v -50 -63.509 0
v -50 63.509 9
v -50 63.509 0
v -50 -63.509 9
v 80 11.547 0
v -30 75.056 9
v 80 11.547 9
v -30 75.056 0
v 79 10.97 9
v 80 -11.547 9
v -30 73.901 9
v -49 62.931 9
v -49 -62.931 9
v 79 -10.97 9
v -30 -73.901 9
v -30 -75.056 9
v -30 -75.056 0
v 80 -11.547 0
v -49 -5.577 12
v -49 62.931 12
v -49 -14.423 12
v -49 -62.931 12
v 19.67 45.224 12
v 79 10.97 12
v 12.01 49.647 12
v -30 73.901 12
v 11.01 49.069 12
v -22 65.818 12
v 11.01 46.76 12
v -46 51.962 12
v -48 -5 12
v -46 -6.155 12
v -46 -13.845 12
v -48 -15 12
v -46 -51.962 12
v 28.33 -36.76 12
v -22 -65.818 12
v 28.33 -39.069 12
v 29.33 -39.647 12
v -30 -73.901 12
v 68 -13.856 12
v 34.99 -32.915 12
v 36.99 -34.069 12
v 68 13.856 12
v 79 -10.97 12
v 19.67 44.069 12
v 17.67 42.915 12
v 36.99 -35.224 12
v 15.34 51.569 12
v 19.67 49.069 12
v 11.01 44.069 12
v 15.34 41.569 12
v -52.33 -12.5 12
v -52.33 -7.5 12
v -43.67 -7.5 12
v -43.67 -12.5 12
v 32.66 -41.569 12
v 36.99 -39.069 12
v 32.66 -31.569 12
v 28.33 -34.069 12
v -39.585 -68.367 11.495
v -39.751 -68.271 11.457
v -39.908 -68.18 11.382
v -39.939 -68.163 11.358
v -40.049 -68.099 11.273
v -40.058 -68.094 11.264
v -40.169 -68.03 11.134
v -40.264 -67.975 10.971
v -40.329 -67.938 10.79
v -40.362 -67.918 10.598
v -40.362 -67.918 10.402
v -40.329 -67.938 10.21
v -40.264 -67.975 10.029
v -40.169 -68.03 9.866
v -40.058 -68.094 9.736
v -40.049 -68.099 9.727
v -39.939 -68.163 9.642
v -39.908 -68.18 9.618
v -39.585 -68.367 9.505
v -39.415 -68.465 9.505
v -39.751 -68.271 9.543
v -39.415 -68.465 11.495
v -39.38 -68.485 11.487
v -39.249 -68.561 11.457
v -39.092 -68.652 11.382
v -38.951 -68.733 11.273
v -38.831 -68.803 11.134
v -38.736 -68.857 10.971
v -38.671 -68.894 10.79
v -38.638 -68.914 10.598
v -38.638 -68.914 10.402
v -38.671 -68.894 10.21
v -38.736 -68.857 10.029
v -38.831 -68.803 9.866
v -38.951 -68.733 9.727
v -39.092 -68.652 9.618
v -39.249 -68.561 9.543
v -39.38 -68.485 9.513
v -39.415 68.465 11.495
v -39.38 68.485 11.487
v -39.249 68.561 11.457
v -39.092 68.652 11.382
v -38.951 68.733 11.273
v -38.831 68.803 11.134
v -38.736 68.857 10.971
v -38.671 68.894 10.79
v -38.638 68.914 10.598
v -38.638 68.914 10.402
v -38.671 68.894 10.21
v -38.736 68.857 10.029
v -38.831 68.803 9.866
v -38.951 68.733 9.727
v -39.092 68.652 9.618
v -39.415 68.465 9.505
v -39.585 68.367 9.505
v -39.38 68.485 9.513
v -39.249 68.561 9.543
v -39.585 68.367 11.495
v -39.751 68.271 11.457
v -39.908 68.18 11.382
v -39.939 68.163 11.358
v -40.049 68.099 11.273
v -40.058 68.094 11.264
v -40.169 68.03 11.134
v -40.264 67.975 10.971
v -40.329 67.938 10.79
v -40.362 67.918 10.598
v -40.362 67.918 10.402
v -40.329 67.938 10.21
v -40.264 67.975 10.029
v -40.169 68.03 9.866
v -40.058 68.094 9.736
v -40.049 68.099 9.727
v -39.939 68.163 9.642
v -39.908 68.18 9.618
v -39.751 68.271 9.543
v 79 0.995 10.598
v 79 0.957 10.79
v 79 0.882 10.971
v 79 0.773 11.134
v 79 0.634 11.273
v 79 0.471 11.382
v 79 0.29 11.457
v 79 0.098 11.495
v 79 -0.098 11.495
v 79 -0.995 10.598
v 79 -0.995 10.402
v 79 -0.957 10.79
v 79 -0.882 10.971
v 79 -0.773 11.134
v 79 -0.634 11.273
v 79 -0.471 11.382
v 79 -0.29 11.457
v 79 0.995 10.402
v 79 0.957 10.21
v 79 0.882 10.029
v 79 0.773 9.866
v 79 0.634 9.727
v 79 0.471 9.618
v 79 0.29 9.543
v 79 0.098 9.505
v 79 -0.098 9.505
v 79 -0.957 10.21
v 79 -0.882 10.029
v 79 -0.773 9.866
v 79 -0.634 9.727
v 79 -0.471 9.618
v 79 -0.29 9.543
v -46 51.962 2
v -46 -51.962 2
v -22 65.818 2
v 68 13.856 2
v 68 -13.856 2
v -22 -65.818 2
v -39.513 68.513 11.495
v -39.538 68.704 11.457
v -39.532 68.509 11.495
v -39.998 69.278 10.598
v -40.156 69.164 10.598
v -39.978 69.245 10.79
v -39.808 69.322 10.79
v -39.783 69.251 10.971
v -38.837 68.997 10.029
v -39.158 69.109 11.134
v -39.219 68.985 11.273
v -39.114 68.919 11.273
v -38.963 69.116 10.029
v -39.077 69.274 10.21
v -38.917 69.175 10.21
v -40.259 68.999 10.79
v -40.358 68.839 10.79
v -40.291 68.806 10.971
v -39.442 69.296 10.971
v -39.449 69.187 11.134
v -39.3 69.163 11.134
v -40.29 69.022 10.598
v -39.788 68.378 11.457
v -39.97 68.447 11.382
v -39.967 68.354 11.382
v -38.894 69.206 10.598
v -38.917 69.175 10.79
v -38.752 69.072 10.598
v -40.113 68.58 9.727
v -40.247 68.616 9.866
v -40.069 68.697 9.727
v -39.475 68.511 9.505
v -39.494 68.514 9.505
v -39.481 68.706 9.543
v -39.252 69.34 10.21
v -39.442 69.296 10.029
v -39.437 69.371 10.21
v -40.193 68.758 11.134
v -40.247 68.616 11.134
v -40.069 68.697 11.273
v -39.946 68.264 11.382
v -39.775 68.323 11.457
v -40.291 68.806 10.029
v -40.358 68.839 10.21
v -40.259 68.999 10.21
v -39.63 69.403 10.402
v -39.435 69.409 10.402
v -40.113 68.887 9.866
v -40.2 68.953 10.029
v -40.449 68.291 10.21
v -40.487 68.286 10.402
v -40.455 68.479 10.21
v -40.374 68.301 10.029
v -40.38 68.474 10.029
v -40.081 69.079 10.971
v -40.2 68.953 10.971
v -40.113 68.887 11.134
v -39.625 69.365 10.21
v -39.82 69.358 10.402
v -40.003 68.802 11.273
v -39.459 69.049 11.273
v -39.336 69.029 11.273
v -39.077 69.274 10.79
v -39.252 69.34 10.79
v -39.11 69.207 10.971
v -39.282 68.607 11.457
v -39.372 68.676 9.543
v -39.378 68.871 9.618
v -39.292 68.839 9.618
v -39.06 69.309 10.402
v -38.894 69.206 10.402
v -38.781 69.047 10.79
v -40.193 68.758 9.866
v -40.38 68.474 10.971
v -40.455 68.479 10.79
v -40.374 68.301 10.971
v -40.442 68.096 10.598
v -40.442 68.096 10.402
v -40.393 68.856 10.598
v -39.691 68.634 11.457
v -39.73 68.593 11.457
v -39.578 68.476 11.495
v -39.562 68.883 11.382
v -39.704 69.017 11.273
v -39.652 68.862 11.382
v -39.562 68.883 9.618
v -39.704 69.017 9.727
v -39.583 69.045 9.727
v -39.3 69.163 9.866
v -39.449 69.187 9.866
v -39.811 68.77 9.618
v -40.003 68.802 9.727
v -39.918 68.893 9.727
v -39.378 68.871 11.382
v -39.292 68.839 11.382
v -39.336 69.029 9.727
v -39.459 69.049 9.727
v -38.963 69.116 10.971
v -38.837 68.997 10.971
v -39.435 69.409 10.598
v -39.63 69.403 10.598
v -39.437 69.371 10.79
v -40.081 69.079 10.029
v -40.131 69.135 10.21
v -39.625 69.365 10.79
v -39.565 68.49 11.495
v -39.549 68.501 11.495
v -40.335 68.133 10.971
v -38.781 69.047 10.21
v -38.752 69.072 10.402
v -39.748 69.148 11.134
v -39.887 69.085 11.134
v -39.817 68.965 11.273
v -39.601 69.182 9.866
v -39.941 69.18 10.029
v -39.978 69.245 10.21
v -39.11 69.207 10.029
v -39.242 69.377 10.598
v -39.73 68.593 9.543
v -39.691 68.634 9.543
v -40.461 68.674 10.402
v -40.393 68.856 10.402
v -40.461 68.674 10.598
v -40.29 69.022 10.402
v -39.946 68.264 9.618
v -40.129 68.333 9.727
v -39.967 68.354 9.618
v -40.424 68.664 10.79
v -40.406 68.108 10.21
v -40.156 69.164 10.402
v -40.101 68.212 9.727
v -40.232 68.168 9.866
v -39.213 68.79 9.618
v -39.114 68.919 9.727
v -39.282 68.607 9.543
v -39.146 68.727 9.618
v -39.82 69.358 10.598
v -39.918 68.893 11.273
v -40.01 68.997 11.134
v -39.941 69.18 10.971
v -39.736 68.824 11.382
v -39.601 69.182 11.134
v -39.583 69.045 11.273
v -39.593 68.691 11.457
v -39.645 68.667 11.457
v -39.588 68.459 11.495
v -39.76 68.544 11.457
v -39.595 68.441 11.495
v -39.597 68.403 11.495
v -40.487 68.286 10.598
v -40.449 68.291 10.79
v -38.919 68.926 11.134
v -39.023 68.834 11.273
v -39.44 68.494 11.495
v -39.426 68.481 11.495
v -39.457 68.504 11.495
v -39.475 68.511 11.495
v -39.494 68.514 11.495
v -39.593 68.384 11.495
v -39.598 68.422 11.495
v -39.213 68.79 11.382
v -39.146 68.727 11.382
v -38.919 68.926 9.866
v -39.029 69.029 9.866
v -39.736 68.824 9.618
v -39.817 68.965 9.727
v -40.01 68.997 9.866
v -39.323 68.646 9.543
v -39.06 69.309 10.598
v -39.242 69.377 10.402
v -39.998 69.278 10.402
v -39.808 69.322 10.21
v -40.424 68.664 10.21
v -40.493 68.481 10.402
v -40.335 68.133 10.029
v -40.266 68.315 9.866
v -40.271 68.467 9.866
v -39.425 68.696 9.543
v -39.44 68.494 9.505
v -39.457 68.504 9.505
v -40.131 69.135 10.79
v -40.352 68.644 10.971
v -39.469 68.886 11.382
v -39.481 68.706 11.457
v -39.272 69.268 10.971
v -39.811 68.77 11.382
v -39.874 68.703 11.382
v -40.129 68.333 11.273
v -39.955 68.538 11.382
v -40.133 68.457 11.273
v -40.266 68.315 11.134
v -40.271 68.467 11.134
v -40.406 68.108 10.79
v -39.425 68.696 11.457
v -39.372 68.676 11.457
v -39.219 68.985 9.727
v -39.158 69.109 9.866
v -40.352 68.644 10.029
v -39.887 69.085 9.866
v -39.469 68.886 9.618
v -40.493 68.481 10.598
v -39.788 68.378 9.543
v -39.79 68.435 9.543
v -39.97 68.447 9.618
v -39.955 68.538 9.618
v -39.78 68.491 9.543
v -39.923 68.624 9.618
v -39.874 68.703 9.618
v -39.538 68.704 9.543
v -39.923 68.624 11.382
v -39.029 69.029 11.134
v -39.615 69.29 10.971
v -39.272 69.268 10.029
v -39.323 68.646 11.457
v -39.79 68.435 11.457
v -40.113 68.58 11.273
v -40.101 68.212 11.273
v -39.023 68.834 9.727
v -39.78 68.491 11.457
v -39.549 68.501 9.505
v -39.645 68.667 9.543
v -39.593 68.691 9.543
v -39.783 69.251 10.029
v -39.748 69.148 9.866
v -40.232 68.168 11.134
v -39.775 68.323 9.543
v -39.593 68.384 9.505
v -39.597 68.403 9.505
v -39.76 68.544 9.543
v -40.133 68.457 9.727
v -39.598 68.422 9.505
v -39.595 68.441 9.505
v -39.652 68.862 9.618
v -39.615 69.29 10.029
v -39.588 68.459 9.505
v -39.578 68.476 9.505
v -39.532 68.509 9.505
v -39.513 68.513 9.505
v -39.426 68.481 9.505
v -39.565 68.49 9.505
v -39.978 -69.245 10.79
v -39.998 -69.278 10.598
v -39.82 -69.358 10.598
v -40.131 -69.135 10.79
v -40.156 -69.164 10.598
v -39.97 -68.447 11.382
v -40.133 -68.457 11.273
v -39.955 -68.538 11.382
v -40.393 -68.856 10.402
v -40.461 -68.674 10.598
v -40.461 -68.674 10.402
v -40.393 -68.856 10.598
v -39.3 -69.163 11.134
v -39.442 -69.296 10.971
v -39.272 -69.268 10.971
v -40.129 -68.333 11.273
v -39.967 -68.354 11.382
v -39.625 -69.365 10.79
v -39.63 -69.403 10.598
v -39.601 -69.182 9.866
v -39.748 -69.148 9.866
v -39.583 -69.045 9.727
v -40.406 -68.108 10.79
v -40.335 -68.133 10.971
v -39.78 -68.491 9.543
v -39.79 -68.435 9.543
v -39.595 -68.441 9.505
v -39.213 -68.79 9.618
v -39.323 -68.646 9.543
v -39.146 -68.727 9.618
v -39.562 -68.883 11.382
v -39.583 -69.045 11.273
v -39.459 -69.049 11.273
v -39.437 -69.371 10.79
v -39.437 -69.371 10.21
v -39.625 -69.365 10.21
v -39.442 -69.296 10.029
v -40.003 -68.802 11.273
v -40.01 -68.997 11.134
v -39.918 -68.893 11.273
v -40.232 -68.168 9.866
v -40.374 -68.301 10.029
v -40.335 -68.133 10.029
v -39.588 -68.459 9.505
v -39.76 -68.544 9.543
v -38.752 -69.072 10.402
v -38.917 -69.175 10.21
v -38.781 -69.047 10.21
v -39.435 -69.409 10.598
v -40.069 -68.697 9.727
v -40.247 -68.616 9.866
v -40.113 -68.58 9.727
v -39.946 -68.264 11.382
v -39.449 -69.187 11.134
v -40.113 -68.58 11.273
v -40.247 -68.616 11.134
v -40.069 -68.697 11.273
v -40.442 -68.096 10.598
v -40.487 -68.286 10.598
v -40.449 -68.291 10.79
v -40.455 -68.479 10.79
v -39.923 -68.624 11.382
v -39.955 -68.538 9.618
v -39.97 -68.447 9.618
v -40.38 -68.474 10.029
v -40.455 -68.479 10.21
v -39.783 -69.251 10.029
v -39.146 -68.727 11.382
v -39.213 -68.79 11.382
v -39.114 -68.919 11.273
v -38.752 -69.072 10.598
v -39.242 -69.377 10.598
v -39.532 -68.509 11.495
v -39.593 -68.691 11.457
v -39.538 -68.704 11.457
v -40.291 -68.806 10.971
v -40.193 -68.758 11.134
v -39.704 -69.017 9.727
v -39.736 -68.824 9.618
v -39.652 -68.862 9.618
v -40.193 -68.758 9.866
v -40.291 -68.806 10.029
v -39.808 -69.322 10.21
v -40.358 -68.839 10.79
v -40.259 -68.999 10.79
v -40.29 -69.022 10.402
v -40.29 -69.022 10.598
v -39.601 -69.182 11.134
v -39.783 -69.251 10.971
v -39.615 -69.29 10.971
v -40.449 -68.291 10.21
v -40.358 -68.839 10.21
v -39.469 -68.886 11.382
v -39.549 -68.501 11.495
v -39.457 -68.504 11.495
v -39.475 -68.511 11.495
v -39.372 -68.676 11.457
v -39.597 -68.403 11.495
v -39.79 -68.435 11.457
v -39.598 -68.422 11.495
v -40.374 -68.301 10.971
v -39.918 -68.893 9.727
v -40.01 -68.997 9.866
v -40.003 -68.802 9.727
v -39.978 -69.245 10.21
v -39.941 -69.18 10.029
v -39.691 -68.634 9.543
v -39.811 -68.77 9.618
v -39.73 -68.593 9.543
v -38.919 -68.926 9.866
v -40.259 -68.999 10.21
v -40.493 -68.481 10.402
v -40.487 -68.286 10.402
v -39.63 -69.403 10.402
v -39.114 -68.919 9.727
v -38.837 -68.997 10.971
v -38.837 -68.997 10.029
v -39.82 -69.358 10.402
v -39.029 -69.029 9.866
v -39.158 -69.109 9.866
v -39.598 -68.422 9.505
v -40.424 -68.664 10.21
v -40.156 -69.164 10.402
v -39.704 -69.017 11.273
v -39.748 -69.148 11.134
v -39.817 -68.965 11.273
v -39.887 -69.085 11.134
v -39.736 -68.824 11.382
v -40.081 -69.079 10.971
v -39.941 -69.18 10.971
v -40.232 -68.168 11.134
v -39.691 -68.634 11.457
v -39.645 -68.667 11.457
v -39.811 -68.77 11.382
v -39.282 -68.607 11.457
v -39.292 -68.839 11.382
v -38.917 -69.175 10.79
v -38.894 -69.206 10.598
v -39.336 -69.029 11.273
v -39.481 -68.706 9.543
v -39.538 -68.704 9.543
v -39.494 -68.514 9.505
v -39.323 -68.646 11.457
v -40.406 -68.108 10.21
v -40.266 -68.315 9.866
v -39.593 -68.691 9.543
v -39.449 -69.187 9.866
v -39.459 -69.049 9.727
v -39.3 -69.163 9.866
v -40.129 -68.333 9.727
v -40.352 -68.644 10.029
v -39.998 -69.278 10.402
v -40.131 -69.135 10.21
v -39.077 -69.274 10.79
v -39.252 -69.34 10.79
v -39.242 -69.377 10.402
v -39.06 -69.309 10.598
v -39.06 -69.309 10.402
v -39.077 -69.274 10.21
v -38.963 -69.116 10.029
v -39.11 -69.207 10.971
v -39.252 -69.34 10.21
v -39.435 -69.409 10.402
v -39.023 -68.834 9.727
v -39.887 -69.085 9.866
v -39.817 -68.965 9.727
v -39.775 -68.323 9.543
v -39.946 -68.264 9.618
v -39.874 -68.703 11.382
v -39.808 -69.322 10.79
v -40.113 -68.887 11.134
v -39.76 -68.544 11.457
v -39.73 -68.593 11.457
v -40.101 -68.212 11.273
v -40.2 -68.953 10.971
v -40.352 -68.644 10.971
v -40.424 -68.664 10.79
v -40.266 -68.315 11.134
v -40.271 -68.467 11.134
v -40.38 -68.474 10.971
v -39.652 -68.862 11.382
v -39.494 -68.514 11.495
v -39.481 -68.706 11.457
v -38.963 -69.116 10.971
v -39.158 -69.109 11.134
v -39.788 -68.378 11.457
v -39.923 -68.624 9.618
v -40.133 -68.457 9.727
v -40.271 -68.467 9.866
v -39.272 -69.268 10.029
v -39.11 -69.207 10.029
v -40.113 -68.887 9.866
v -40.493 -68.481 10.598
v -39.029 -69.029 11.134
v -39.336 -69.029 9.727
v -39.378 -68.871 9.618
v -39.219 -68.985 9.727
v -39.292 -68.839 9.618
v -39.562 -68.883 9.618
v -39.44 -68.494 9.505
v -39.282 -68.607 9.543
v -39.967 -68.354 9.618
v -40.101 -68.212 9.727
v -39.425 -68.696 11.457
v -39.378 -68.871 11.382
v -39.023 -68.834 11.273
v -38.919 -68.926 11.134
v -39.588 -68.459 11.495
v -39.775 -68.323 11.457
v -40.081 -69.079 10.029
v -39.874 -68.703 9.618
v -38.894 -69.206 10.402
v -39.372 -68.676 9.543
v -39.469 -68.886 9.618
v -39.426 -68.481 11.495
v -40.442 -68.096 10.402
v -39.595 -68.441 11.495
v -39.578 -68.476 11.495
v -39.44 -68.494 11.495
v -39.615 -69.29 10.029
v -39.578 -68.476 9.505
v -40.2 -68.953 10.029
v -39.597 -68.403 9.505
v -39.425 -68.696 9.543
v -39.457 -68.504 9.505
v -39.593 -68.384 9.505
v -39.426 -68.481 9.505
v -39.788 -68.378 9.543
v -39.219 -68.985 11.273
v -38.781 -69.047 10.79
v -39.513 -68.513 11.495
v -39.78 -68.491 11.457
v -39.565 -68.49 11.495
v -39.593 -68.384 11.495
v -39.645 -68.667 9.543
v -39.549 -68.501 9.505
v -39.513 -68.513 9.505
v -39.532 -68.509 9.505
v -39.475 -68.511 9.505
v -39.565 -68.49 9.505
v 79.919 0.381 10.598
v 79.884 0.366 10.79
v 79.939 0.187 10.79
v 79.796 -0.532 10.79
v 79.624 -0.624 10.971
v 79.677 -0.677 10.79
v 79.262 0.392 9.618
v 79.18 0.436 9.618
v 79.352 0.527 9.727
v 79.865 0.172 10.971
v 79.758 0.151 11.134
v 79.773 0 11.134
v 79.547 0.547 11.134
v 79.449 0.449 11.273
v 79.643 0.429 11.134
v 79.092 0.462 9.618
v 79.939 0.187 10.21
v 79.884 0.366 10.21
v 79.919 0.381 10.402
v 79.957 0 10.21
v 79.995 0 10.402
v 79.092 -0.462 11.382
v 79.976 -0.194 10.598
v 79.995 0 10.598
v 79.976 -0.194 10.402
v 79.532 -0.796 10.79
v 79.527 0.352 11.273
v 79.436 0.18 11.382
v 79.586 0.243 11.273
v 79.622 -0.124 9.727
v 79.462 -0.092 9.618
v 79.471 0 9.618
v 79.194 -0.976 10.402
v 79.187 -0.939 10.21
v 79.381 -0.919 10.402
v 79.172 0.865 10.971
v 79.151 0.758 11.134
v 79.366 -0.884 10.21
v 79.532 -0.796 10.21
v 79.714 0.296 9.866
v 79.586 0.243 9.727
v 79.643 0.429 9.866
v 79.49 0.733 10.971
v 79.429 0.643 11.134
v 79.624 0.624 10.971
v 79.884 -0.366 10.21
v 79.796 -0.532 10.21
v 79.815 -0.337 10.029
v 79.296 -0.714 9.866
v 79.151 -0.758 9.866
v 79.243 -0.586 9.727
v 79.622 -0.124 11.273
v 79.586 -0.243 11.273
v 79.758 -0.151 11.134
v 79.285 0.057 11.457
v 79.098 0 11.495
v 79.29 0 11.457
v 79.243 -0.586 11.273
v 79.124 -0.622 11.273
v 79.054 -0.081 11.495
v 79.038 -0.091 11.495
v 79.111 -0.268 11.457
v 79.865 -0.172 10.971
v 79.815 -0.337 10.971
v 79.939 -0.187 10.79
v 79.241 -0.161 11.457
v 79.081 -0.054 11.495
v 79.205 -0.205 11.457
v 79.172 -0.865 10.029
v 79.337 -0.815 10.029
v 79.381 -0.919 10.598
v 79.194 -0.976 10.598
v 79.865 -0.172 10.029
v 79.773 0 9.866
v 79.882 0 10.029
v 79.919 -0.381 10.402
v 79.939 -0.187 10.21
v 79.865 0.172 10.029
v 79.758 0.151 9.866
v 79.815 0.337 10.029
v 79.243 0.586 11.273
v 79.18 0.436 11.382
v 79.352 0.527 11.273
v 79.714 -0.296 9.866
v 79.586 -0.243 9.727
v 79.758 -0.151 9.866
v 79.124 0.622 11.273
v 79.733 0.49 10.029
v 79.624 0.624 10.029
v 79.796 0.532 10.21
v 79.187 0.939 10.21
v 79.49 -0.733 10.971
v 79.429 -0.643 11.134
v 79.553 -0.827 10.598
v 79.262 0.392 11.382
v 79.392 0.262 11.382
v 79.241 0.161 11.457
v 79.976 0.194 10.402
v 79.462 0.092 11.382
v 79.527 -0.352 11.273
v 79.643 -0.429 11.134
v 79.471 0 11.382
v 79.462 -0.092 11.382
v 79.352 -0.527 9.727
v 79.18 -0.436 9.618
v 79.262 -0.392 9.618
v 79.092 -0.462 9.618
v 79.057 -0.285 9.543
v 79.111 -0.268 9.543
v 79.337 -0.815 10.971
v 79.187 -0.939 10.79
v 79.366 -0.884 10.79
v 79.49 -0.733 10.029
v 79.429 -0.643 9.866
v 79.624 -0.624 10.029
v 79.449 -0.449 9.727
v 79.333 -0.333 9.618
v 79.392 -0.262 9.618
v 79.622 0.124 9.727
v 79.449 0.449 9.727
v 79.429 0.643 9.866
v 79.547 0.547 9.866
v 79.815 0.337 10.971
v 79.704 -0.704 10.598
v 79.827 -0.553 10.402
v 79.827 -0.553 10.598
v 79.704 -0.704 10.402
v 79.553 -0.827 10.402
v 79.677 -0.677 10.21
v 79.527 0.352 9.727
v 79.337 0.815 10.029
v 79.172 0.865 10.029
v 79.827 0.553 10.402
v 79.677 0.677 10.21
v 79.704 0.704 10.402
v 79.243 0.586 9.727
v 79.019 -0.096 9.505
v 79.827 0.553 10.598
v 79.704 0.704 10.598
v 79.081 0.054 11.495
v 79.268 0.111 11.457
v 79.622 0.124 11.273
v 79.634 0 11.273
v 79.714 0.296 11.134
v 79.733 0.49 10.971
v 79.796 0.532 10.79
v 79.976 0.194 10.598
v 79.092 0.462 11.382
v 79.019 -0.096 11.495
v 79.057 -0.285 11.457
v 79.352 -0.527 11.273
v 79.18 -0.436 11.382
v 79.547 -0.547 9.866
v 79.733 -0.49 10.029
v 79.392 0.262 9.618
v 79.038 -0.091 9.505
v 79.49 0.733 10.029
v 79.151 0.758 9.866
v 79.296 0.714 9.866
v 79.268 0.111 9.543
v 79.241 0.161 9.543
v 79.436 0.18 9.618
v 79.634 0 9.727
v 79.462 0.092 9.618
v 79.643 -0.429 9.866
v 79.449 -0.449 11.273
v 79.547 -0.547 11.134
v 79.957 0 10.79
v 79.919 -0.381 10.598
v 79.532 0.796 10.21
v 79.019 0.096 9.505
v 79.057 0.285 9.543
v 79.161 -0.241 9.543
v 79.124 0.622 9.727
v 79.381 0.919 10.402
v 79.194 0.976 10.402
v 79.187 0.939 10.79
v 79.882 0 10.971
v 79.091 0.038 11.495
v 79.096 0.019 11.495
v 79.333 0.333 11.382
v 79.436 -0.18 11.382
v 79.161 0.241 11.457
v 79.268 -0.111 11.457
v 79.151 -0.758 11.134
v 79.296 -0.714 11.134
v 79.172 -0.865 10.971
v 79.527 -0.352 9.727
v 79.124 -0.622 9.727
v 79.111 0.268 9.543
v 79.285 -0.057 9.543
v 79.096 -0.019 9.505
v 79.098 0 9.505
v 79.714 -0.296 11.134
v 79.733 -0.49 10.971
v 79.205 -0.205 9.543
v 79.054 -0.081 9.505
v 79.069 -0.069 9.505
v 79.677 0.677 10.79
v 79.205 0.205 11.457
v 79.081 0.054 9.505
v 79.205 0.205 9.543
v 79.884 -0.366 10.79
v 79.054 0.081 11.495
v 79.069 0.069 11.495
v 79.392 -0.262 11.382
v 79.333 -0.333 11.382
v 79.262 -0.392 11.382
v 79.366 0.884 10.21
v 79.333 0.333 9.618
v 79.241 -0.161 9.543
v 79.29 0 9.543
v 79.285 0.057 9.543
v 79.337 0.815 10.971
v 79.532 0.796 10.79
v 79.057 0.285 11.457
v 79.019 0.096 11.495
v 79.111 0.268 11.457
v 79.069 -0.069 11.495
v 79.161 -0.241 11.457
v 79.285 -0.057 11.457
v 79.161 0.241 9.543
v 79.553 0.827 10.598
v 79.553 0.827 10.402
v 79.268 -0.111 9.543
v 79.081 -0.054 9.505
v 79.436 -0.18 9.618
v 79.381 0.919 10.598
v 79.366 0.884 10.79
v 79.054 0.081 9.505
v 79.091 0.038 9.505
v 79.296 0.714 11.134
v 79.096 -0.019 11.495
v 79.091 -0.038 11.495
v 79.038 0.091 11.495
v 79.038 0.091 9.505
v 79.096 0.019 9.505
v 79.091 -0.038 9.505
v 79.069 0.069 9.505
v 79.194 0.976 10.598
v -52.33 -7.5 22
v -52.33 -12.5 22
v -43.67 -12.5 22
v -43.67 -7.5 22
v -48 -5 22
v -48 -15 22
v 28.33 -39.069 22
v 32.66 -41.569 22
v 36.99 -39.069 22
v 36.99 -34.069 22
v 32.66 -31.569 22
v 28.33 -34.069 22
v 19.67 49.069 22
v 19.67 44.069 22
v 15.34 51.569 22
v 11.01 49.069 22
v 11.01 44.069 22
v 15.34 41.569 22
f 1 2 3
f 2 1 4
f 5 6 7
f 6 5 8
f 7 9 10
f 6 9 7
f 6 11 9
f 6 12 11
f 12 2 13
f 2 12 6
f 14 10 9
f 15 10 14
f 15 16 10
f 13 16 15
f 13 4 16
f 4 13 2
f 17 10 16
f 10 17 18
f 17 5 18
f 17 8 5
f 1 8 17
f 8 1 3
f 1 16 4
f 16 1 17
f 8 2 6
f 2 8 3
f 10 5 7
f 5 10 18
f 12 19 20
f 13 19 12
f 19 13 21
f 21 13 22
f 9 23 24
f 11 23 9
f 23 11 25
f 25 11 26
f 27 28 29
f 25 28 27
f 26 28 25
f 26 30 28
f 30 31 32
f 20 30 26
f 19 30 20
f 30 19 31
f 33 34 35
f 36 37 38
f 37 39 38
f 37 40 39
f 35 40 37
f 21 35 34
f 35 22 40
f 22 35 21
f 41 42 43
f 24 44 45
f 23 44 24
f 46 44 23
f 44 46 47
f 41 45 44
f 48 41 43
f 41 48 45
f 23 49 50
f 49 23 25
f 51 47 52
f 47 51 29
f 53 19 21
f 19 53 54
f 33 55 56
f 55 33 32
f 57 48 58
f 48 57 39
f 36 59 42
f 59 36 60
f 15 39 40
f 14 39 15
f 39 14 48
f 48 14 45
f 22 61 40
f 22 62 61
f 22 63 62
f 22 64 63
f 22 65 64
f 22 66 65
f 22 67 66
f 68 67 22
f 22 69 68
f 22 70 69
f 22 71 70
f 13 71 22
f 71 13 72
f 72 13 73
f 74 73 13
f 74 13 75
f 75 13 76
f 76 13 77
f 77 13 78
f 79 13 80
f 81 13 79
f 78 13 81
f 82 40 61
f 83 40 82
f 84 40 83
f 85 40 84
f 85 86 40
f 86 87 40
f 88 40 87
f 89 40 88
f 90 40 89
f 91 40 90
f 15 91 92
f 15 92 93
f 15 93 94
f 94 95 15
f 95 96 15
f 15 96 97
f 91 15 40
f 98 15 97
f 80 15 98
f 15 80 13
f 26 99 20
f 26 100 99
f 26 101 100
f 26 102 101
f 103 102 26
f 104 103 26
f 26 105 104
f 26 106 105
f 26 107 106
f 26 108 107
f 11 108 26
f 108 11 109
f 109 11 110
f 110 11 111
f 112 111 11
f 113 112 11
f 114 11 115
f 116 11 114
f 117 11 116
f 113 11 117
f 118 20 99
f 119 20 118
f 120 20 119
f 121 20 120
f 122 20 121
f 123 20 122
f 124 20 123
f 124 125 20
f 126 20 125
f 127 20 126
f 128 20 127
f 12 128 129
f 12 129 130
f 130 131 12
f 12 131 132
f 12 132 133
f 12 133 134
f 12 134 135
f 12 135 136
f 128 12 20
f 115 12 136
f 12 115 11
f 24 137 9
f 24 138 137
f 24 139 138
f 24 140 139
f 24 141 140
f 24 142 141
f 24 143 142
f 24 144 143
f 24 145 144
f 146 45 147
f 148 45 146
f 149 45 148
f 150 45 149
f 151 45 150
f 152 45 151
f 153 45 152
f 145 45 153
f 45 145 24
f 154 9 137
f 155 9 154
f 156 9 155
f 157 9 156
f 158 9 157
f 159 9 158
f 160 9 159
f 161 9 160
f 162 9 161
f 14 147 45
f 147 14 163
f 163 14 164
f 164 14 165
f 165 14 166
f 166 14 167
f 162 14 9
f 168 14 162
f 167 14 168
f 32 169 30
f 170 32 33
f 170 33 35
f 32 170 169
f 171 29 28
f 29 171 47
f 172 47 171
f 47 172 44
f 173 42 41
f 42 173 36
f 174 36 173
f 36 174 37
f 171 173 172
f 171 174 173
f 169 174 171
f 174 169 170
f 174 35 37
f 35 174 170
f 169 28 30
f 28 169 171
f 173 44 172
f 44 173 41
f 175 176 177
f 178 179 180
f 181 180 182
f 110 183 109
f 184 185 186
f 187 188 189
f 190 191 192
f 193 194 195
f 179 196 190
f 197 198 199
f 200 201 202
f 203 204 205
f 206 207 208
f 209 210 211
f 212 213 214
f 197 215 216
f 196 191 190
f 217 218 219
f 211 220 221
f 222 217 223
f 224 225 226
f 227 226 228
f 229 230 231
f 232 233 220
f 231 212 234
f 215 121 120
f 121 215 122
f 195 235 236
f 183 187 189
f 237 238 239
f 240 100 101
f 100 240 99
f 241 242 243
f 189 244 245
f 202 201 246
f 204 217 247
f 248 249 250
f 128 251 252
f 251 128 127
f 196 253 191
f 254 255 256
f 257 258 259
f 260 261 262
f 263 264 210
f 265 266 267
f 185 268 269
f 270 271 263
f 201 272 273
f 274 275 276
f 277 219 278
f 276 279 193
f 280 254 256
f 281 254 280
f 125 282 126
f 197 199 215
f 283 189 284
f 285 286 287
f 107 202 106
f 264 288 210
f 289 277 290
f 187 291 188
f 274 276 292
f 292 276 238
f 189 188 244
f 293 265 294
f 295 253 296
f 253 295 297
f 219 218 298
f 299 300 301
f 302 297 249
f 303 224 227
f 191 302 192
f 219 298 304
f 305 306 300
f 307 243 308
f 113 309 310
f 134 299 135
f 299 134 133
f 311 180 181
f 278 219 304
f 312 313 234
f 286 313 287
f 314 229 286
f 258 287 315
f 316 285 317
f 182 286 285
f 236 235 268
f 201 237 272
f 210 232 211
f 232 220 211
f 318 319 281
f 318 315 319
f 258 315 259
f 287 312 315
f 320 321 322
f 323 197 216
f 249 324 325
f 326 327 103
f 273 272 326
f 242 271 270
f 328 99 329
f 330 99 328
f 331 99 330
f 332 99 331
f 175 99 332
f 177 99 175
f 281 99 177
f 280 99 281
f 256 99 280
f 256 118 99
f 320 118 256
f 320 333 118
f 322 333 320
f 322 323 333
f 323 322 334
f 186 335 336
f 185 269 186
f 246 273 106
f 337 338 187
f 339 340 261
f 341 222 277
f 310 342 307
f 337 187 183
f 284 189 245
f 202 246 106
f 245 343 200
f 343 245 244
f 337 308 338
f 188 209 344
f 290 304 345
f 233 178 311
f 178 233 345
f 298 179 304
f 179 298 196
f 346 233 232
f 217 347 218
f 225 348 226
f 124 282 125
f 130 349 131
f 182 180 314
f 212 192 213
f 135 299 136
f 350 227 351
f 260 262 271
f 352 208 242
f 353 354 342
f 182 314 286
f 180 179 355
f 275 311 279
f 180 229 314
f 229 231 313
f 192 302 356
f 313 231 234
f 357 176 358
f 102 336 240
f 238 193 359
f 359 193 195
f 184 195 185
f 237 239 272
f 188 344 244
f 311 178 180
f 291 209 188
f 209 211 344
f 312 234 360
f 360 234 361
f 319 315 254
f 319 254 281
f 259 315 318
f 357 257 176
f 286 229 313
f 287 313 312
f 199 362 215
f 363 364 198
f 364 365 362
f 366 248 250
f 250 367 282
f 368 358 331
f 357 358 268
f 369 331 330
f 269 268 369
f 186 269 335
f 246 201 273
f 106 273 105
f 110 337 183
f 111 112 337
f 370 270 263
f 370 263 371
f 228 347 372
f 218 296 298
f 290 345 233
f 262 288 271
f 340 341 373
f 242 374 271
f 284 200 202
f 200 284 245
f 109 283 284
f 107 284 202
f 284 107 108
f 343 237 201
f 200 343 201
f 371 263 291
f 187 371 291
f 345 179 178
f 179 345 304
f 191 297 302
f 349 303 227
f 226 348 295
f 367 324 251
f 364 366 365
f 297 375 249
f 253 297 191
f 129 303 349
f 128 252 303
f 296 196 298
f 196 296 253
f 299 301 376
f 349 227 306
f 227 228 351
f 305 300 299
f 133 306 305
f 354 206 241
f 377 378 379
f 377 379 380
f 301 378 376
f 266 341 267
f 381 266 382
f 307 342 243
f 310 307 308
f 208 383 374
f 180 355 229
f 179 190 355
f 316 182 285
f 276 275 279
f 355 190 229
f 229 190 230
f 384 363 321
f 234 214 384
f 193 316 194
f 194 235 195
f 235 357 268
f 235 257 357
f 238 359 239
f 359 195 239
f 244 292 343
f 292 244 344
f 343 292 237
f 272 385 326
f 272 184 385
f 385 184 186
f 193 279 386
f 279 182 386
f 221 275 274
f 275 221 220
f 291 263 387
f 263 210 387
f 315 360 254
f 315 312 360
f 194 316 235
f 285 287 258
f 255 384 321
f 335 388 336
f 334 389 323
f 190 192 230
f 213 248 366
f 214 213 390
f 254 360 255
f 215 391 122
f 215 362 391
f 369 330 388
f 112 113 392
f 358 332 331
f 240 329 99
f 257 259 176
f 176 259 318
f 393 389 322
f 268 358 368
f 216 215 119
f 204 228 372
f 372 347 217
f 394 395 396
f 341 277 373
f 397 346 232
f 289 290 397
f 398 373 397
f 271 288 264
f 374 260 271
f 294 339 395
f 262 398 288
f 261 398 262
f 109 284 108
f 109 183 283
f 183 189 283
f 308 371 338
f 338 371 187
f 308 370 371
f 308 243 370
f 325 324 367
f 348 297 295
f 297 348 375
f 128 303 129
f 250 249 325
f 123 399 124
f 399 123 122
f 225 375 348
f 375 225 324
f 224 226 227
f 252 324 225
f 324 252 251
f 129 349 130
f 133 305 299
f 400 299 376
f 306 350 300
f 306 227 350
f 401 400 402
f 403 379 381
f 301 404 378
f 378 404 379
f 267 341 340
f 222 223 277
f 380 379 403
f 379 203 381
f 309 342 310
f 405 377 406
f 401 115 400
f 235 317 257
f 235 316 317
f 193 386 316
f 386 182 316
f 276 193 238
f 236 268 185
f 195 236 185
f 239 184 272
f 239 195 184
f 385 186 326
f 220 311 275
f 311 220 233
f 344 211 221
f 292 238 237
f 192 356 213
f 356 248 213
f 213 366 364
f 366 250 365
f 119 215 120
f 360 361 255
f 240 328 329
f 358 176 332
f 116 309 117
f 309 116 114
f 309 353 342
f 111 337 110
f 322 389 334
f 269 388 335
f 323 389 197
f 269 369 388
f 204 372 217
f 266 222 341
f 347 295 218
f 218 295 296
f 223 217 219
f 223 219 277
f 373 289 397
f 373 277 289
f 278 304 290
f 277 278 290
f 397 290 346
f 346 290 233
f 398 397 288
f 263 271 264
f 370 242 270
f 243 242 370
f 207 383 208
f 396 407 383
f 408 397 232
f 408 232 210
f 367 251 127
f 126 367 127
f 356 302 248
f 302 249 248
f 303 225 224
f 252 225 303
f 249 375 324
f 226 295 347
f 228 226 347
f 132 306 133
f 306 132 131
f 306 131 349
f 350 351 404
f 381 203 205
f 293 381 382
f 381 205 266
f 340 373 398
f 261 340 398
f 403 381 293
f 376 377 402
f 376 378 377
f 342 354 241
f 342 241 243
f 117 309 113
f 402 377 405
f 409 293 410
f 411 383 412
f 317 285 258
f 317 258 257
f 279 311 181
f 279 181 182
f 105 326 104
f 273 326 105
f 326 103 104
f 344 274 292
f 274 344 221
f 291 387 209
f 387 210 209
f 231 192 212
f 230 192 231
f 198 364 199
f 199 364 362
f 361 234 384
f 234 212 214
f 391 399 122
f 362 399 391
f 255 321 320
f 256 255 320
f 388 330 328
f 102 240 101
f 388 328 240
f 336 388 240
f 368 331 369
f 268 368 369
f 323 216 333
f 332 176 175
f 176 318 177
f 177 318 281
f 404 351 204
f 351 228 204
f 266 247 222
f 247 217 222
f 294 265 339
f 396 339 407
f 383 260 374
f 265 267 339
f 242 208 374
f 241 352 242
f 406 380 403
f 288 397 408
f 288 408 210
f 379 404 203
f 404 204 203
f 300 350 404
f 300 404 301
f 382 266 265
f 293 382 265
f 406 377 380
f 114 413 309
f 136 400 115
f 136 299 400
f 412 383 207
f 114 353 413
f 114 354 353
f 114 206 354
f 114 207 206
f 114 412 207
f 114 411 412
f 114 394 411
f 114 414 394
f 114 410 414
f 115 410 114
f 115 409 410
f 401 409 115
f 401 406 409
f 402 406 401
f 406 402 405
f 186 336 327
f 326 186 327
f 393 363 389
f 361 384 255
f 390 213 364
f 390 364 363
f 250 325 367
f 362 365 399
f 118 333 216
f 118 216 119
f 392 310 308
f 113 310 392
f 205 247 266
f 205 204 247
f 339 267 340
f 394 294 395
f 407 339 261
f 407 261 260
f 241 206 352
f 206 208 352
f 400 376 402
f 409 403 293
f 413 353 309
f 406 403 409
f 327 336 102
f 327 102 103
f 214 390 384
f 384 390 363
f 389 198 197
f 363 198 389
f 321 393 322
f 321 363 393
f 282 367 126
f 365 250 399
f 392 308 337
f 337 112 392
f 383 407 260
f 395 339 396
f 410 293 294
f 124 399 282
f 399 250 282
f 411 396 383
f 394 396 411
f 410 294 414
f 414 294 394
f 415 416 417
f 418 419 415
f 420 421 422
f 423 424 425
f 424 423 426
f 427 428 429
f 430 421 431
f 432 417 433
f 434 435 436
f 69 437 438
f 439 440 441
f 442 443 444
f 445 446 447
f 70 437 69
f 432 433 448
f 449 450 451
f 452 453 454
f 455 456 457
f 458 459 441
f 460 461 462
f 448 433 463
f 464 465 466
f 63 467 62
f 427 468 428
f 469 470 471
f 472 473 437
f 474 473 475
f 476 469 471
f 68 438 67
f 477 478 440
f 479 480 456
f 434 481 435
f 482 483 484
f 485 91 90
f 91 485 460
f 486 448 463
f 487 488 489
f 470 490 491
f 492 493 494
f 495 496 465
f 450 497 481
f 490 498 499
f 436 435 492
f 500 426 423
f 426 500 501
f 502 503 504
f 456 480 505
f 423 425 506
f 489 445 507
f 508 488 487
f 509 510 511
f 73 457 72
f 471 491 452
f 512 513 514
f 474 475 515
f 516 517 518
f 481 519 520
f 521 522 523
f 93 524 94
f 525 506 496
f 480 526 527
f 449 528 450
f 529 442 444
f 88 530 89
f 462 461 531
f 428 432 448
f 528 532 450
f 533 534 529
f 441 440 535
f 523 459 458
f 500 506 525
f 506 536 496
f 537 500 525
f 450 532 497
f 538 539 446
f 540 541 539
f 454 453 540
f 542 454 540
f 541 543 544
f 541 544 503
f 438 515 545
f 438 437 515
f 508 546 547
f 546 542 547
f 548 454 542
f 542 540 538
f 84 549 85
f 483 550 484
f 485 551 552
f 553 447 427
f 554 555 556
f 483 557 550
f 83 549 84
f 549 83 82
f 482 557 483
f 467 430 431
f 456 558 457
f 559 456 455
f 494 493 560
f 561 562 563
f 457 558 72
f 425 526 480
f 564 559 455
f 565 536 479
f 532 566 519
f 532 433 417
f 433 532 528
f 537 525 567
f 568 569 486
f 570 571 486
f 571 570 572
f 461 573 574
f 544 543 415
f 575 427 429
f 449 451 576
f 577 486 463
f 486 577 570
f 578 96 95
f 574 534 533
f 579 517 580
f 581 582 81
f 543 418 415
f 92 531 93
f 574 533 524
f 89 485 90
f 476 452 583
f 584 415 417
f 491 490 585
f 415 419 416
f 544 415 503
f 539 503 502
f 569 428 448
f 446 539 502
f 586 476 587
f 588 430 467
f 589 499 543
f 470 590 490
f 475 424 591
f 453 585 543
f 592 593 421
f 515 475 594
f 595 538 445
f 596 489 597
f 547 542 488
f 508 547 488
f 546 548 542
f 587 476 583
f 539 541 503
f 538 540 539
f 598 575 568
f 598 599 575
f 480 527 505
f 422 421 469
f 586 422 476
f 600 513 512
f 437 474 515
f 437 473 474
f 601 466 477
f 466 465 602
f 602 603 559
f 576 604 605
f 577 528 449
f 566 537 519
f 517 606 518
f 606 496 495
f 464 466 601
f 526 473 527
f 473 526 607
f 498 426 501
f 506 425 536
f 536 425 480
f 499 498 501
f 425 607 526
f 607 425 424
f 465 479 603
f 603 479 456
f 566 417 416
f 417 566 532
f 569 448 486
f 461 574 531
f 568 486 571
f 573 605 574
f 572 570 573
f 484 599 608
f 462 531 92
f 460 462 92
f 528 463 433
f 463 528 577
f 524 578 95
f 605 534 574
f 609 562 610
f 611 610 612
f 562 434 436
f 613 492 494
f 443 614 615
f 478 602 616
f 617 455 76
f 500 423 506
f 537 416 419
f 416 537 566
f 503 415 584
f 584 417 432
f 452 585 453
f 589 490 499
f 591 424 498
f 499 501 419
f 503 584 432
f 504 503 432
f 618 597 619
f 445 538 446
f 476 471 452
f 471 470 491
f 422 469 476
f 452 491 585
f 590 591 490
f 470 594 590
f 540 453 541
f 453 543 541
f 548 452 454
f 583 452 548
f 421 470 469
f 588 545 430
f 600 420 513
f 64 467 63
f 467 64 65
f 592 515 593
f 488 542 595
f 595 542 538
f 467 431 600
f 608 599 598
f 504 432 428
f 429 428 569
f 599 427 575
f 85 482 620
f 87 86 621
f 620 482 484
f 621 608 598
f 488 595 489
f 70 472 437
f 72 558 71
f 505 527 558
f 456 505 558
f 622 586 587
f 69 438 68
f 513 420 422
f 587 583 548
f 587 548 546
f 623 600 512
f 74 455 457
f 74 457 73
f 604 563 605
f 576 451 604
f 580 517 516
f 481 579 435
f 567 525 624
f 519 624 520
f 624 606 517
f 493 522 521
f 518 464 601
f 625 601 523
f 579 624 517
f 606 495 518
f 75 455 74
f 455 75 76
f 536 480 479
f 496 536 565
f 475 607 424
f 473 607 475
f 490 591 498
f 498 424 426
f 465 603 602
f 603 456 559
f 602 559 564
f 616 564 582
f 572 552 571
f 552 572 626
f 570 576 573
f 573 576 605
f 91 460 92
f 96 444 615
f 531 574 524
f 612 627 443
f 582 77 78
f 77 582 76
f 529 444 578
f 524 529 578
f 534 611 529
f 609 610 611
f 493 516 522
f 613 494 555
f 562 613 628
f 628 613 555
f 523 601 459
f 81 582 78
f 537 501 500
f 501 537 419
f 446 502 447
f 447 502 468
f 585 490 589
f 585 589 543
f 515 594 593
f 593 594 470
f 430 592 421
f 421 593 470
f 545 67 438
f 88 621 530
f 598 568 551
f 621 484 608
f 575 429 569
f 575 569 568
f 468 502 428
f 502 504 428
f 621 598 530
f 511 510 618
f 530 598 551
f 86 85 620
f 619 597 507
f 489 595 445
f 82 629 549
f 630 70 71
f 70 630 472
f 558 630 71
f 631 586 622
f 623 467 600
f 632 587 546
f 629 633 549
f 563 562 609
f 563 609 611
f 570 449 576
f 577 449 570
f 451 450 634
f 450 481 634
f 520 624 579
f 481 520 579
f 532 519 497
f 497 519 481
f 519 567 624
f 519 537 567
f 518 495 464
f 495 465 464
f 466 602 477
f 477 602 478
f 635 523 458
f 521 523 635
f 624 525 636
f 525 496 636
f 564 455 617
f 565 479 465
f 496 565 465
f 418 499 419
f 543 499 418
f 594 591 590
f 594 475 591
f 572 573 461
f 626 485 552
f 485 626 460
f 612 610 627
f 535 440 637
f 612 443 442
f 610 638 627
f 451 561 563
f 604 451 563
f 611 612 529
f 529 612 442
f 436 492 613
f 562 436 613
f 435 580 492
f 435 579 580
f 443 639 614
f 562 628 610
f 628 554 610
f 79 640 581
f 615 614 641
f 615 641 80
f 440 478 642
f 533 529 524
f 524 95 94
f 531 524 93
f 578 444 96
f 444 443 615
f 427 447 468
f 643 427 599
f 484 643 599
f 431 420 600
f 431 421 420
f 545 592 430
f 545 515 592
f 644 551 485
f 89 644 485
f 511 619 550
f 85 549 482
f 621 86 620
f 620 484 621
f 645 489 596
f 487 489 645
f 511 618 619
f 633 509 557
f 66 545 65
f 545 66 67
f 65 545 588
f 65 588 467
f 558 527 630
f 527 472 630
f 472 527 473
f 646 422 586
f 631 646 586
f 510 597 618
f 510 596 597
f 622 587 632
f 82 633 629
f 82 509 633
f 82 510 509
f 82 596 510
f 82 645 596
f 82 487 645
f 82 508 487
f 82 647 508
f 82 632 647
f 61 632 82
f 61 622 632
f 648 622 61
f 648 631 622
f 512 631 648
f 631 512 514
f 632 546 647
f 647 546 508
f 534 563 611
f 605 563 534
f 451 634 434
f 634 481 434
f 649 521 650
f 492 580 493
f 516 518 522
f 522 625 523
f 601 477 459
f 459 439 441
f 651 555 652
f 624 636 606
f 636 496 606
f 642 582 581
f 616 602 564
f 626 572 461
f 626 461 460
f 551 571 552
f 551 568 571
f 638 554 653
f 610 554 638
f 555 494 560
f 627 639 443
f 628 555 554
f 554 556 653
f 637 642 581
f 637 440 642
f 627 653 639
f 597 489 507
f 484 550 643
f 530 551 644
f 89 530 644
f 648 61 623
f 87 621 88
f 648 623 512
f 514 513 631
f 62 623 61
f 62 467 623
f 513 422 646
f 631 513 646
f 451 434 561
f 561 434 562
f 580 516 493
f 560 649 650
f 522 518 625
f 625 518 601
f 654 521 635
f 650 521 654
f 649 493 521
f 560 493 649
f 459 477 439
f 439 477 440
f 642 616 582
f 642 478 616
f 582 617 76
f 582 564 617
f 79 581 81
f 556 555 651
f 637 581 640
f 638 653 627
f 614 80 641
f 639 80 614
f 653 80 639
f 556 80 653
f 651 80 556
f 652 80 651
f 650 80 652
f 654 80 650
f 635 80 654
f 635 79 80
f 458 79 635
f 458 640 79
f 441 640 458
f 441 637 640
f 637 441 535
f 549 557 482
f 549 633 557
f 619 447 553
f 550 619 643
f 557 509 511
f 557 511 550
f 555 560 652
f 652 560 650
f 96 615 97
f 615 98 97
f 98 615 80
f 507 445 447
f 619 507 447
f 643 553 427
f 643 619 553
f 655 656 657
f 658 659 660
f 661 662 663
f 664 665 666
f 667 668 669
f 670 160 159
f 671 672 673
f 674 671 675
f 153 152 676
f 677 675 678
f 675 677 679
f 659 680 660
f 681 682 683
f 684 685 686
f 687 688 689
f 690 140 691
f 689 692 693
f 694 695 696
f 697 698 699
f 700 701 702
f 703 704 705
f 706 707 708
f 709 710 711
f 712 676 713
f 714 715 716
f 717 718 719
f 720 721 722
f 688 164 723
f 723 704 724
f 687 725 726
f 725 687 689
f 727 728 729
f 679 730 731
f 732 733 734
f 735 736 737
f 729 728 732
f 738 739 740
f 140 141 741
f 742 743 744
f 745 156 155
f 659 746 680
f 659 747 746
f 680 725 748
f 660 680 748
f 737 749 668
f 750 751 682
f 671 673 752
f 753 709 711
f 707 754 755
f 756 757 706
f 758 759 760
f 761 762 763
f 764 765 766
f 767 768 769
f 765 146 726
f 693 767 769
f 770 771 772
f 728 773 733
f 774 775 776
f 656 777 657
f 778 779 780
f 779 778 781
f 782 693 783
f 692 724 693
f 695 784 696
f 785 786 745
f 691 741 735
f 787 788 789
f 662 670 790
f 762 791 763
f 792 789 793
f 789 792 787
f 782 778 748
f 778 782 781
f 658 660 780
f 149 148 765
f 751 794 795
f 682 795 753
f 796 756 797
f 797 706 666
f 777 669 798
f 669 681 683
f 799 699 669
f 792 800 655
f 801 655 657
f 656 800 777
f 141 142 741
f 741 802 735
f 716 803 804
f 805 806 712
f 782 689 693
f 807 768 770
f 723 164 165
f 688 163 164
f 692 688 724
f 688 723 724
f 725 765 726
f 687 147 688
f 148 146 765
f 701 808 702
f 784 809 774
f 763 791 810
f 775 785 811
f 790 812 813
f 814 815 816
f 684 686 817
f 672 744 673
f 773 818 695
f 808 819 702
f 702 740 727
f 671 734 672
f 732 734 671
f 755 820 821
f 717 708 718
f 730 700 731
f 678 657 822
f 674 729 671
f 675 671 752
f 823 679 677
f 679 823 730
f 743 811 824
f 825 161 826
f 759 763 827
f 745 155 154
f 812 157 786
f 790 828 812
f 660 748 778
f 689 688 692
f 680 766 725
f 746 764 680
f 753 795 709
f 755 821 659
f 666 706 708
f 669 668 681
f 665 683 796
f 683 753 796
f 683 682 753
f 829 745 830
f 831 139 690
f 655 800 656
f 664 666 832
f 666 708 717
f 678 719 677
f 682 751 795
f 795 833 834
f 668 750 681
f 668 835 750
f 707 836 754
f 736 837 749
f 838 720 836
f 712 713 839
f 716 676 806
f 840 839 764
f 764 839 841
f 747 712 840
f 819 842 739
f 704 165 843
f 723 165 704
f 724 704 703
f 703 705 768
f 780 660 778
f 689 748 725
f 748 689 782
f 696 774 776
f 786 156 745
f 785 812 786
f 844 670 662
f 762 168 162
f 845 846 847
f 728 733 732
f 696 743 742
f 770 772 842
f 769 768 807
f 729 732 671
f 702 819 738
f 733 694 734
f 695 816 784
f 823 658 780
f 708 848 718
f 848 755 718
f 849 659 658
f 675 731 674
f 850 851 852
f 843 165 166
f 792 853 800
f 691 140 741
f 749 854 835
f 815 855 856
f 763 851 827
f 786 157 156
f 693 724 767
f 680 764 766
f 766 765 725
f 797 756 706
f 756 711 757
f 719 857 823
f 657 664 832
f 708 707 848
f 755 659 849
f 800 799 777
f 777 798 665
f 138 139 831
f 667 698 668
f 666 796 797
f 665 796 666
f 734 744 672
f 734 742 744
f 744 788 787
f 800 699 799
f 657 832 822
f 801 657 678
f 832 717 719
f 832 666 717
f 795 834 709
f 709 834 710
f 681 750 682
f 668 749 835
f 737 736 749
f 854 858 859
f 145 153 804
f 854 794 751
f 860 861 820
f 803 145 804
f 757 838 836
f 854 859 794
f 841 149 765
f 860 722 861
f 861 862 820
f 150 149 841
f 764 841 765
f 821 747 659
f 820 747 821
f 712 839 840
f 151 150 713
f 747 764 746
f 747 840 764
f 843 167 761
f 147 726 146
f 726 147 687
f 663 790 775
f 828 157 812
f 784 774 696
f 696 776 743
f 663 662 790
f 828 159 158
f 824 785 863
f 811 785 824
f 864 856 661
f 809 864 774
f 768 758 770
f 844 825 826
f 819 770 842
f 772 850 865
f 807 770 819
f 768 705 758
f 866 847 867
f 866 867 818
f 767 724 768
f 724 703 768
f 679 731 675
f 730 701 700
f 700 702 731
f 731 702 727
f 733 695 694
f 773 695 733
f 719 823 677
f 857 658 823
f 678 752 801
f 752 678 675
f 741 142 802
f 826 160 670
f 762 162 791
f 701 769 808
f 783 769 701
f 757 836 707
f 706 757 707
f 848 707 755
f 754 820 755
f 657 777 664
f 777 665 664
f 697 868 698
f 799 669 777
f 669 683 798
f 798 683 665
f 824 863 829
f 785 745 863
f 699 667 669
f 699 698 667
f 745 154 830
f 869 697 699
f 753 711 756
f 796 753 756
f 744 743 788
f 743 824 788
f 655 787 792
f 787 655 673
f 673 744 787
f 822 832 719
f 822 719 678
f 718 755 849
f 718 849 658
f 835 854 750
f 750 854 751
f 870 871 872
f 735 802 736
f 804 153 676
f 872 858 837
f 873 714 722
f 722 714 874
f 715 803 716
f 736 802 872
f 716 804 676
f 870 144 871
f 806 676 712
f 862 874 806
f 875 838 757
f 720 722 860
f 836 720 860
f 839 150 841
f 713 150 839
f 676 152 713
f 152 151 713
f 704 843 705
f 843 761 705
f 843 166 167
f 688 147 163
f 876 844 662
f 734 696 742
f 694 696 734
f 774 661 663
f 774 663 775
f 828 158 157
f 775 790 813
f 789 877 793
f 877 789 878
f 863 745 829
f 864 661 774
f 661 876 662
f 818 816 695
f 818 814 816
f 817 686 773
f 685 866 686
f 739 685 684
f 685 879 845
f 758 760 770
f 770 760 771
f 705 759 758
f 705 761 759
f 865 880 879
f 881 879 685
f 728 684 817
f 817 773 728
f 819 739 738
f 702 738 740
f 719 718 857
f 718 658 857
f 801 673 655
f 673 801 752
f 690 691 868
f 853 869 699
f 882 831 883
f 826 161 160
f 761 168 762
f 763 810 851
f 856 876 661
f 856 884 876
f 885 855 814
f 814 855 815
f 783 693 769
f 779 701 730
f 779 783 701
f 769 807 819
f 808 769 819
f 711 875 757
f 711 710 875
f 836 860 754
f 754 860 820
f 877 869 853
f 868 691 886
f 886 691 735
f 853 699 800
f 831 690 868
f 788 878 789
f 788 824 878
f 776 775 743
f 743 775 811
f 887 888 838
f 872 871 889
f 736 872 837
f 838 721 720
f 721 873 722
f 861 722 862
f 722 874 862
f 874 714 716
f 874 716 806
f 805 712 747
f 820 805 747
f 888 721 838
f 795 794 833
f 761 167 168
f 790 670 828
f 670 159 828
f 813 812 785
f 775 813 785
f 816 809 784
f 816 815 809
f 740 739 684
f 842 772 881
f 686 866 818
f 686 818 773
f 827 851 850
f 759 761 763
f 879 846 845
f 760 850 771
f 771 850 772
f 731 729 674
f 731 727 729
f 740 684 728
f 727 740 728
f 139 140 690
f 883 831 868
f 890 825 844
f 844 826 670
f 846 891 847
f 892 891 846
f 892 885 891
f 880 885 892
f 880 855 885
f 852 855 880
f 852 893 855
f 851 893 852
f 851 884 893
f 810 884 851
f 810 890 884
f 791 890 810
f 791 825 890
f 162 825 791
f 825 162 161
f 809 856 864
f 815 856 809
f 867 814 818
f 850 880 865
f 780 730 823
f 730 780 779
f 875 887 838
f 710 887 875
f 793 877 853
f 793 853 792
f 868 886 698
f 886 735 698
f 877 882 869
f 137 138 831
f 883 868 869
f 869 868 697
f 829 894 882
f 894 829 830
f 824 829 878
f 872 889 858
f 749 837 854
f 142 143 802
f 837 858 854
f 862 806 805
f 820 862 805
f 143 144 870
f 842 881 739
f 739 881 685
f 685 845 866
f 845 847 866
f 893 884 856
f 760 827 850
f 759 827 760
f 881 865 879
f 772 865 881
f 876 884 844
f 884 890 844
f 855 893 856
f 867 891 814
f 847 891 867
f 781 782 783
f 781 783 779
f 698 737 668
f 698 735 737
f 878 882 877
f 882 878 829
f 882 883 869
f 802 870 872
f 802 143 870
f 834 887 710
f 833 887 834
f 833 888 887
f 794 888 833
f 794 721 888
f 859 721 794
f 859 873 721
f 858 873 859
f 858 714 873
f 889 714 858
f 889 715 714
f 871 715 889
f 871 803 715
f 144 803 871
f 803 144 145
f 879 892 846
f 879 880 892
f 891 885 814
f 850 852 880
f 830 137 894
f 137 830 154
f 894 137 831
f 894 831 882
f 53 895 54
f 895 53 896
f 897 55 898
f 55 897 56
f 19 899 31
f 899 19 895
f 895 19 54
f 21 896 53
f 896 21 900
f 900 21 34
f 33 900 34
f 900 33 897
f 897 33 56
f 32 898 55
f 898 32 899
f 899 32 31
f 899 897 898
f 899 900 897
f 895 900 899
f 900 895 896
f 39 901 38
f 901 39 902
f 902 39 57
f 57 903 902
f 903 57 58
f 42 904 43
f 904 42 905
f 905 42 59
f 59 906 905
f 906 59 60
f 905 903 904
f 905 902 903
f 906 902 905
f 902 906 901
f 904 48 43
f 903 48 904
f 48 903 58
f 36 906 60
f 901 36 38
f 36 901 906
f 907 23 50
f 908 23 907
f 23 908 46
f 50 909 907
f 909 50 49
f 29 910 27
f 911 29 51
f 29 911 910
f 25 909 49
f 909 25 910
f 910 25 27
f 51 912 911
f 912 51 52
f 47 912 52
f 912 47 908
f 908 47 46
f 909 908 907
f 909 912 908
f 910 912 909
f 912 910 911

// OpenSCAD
//  import("Nanoleaf_Body.stl");

$fn = 32;

base = 2;
wall = 4;
height = 10;
radius = 100;

module base() {
    difference() {
        union() {
            intersection() {
                cylinder(height+base-3, r=radius, $fn=3);
                rotate([0,0,180]) cylinder(height+base-3, r=1.6*radius, $fn=3);
            }
            intersection() {
                cylinder(height+base, r=radius-2, $fn=3);
                rotate([0,0,180]) cylinder(height+base, r=1.6*radius-2, $fn=3);
            }
        }
        translate([0,0,base]) intersection() {
            cylinder(height+base, r=radius-2*wall, $fn=3);
            rotate([0,0,180]) cylinder(height+base, r=1.6*radius-6*wall, $fn=3);
        }
    }
    
    for (i = [1:3]) {
        rotate([0,0,i*360/3]) translate([1.6*radius/2-1,0,height+base-1.5]) sphere(r=1);
    }
    for (i = [1:3]) {
        rotate([0,0,(i+0.5)*360/3]) translate([radius/2-2,10,height+base]) rotate([0,0,360/12]) cylinder(height, r=5, $fn=6);
    }
}


base();
